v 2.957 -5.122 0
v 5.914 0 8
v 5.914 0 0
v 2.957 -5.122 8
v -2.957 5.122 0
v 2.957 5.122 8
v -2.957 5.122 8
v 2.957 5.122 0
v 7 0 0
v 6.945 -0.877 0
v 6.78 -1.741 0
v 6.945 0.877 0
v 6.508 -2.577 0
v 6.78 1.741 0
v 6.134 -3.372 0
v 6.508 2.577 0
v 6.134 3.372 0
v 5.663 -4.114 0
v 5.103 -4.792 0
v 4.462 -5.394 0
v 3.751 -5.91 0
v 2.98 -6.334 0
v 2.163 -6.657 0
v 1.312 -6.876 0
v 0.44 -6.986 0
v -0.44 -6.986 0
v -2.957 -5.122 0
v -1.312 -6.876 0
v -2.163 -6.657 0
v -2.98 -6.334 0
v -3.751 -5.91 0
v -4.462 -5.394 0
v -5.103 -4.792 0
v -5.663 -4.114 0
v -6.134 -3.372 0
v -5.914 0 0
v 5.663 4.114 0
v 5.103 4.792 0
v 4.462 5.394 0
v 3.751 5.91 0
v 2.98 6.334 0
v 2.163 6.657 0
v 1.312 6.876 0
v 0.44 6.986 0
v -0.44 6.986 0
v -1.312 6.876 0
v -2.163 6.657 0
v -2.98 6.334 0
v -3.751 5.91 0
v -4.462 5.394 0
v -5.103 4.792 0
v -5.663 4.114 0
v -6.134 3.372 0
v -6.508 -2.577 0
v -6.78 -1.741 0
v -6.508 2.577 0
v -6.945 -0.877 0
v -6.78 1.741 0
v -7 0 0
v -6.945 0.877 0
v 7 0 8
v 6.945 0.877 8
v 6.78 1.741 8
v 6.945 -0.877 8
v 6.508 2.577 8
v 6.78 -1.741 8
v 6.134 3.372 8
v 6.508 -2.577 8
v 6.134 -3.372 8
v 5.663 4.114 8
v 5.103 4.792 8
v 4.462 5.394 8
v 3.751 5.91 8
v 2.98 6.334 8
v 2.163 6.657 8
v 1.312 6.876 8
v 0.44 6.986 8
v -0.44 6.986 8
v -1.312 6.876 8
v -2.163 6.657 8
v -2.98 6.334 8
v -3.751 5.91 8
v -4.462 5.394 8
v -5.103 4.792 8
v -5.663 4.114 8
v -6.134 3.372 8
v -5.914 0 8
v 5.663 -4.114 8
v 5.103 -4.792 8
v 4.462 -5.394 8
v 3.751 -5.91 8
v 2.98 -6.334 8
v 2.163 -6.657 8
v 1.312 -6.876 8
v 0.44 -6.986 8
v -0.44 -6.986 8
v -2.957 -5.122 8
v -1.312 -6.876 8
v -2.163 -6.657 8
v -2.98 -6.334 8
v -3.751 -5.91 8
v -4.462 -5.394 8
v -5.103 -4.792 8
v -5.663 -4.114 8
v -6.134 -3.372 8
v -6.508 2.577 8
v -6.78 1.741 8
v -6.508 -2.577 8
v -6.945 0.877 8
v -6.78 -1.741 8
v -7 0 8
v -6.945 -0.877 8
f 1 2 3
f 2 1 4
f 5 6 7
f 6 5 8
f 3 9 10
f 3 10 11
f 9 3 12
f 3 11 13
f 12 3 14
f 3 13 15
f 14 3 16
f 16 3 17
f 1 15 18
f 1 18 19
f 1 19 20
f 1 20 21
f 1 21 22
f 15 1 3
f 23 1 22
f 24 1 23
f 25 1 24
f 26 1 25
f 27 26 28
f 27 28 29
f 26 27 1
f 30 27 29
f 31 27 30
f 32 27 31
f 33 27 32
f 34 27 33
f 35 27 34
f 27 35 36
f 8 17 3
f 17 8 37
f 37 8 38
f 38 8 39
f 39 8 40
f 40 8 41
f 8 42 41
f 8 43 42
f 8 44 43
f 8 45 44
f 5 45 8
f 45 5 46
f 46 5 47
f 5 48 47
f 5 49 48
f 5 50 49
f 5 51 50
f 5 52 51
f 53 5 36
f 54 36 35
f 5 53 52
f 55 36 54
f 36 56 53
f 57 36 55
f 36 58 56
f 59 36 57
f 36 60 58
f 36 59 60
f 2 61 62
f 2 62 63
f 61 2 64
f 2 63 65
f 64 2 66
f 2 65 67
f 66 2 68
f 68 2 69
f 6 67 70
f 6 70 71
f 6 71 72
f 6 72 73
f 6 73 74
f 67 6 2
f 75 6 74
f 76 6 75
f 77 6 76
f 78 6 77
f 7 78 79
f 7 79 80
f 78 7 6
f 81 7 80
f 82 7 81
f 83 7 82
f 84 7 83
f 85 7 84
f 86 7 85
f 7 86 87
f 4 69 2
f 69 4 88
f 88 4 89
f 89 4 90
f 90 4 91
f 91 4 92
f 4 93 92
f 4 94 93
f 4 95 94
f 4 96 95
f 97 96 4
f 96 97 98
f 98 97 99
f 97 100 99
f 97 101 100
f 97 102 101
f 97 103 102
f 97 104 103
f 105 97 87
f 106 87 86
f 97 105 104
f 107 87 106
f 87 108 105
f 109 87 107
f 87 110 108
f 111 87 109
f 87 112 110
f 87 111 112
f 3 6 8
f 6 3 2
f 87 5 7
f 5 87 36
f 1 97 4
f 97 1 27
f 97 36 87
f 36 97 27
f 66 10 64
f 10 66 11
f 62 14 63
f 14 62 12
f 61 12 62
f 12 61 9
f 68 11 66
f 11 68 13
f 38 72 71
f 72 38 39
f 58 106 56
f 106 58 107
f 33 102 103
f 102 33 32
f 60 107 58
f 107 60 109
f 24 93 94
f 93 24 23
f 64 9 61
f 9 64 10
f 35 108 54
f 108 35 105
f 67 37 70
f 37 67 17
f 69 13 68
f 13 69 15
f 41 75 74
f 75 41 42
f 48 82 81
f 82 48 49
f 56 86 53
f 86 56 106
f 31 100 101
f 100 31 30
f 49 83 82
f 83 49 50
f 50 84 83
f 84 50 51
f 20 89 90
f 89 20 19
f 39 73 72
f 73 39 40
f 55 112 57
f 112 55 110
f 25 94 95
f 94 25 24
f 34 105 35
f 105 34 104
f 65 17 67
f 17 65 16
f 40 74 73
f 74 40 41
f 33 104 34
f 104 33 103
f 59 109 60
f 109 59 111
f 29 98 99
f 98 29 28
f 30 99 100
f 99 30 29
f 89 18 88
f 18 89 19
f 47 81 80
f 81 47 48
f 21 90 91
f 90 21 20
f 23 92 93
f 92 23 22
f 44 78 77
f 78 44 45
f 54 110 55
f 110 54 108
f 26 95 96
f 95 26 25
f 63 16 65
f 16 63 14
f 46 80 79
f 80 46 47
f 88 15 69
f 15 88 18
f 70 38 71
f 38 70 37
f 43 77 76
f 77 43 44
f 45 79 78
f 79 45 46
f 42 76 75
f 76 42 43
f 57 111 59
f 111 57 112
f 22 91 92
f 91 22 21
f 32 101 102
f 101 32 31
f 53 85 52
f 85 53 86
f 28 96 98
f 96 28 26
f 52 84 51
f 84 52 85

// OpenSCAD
$fn = 50;


difference() {
	union() {
		cylinder(h = 8, r = 7.0000000000);
	}
	union() {
		translate(v = [0, 0, 0]) {
			rotate(a = [0, 0, 0]) {
				difference() {
					union() {
						#linear_extrude(height = 8) {
							polygon(points = [[5.9142500000, 0.0000000000], [2.9571250000, 5.1218907443], [-2.9571250000, 5.1218907443], [-5.9142500000, 0.0000000000], [-2.9571250000, -5.1218907443], [2.9571250000, -5.1218907443]]);
						}
					}
					union();
				}
			}
		}
		translate(v = [0, 0, -100]) {
			cylinder(h = 200, r = 3.2500000000);
		}
		translate(v = [0, 0, -100]) {
			cylinder(h = 200, r = 1.8000000000);
		}
	}
}
